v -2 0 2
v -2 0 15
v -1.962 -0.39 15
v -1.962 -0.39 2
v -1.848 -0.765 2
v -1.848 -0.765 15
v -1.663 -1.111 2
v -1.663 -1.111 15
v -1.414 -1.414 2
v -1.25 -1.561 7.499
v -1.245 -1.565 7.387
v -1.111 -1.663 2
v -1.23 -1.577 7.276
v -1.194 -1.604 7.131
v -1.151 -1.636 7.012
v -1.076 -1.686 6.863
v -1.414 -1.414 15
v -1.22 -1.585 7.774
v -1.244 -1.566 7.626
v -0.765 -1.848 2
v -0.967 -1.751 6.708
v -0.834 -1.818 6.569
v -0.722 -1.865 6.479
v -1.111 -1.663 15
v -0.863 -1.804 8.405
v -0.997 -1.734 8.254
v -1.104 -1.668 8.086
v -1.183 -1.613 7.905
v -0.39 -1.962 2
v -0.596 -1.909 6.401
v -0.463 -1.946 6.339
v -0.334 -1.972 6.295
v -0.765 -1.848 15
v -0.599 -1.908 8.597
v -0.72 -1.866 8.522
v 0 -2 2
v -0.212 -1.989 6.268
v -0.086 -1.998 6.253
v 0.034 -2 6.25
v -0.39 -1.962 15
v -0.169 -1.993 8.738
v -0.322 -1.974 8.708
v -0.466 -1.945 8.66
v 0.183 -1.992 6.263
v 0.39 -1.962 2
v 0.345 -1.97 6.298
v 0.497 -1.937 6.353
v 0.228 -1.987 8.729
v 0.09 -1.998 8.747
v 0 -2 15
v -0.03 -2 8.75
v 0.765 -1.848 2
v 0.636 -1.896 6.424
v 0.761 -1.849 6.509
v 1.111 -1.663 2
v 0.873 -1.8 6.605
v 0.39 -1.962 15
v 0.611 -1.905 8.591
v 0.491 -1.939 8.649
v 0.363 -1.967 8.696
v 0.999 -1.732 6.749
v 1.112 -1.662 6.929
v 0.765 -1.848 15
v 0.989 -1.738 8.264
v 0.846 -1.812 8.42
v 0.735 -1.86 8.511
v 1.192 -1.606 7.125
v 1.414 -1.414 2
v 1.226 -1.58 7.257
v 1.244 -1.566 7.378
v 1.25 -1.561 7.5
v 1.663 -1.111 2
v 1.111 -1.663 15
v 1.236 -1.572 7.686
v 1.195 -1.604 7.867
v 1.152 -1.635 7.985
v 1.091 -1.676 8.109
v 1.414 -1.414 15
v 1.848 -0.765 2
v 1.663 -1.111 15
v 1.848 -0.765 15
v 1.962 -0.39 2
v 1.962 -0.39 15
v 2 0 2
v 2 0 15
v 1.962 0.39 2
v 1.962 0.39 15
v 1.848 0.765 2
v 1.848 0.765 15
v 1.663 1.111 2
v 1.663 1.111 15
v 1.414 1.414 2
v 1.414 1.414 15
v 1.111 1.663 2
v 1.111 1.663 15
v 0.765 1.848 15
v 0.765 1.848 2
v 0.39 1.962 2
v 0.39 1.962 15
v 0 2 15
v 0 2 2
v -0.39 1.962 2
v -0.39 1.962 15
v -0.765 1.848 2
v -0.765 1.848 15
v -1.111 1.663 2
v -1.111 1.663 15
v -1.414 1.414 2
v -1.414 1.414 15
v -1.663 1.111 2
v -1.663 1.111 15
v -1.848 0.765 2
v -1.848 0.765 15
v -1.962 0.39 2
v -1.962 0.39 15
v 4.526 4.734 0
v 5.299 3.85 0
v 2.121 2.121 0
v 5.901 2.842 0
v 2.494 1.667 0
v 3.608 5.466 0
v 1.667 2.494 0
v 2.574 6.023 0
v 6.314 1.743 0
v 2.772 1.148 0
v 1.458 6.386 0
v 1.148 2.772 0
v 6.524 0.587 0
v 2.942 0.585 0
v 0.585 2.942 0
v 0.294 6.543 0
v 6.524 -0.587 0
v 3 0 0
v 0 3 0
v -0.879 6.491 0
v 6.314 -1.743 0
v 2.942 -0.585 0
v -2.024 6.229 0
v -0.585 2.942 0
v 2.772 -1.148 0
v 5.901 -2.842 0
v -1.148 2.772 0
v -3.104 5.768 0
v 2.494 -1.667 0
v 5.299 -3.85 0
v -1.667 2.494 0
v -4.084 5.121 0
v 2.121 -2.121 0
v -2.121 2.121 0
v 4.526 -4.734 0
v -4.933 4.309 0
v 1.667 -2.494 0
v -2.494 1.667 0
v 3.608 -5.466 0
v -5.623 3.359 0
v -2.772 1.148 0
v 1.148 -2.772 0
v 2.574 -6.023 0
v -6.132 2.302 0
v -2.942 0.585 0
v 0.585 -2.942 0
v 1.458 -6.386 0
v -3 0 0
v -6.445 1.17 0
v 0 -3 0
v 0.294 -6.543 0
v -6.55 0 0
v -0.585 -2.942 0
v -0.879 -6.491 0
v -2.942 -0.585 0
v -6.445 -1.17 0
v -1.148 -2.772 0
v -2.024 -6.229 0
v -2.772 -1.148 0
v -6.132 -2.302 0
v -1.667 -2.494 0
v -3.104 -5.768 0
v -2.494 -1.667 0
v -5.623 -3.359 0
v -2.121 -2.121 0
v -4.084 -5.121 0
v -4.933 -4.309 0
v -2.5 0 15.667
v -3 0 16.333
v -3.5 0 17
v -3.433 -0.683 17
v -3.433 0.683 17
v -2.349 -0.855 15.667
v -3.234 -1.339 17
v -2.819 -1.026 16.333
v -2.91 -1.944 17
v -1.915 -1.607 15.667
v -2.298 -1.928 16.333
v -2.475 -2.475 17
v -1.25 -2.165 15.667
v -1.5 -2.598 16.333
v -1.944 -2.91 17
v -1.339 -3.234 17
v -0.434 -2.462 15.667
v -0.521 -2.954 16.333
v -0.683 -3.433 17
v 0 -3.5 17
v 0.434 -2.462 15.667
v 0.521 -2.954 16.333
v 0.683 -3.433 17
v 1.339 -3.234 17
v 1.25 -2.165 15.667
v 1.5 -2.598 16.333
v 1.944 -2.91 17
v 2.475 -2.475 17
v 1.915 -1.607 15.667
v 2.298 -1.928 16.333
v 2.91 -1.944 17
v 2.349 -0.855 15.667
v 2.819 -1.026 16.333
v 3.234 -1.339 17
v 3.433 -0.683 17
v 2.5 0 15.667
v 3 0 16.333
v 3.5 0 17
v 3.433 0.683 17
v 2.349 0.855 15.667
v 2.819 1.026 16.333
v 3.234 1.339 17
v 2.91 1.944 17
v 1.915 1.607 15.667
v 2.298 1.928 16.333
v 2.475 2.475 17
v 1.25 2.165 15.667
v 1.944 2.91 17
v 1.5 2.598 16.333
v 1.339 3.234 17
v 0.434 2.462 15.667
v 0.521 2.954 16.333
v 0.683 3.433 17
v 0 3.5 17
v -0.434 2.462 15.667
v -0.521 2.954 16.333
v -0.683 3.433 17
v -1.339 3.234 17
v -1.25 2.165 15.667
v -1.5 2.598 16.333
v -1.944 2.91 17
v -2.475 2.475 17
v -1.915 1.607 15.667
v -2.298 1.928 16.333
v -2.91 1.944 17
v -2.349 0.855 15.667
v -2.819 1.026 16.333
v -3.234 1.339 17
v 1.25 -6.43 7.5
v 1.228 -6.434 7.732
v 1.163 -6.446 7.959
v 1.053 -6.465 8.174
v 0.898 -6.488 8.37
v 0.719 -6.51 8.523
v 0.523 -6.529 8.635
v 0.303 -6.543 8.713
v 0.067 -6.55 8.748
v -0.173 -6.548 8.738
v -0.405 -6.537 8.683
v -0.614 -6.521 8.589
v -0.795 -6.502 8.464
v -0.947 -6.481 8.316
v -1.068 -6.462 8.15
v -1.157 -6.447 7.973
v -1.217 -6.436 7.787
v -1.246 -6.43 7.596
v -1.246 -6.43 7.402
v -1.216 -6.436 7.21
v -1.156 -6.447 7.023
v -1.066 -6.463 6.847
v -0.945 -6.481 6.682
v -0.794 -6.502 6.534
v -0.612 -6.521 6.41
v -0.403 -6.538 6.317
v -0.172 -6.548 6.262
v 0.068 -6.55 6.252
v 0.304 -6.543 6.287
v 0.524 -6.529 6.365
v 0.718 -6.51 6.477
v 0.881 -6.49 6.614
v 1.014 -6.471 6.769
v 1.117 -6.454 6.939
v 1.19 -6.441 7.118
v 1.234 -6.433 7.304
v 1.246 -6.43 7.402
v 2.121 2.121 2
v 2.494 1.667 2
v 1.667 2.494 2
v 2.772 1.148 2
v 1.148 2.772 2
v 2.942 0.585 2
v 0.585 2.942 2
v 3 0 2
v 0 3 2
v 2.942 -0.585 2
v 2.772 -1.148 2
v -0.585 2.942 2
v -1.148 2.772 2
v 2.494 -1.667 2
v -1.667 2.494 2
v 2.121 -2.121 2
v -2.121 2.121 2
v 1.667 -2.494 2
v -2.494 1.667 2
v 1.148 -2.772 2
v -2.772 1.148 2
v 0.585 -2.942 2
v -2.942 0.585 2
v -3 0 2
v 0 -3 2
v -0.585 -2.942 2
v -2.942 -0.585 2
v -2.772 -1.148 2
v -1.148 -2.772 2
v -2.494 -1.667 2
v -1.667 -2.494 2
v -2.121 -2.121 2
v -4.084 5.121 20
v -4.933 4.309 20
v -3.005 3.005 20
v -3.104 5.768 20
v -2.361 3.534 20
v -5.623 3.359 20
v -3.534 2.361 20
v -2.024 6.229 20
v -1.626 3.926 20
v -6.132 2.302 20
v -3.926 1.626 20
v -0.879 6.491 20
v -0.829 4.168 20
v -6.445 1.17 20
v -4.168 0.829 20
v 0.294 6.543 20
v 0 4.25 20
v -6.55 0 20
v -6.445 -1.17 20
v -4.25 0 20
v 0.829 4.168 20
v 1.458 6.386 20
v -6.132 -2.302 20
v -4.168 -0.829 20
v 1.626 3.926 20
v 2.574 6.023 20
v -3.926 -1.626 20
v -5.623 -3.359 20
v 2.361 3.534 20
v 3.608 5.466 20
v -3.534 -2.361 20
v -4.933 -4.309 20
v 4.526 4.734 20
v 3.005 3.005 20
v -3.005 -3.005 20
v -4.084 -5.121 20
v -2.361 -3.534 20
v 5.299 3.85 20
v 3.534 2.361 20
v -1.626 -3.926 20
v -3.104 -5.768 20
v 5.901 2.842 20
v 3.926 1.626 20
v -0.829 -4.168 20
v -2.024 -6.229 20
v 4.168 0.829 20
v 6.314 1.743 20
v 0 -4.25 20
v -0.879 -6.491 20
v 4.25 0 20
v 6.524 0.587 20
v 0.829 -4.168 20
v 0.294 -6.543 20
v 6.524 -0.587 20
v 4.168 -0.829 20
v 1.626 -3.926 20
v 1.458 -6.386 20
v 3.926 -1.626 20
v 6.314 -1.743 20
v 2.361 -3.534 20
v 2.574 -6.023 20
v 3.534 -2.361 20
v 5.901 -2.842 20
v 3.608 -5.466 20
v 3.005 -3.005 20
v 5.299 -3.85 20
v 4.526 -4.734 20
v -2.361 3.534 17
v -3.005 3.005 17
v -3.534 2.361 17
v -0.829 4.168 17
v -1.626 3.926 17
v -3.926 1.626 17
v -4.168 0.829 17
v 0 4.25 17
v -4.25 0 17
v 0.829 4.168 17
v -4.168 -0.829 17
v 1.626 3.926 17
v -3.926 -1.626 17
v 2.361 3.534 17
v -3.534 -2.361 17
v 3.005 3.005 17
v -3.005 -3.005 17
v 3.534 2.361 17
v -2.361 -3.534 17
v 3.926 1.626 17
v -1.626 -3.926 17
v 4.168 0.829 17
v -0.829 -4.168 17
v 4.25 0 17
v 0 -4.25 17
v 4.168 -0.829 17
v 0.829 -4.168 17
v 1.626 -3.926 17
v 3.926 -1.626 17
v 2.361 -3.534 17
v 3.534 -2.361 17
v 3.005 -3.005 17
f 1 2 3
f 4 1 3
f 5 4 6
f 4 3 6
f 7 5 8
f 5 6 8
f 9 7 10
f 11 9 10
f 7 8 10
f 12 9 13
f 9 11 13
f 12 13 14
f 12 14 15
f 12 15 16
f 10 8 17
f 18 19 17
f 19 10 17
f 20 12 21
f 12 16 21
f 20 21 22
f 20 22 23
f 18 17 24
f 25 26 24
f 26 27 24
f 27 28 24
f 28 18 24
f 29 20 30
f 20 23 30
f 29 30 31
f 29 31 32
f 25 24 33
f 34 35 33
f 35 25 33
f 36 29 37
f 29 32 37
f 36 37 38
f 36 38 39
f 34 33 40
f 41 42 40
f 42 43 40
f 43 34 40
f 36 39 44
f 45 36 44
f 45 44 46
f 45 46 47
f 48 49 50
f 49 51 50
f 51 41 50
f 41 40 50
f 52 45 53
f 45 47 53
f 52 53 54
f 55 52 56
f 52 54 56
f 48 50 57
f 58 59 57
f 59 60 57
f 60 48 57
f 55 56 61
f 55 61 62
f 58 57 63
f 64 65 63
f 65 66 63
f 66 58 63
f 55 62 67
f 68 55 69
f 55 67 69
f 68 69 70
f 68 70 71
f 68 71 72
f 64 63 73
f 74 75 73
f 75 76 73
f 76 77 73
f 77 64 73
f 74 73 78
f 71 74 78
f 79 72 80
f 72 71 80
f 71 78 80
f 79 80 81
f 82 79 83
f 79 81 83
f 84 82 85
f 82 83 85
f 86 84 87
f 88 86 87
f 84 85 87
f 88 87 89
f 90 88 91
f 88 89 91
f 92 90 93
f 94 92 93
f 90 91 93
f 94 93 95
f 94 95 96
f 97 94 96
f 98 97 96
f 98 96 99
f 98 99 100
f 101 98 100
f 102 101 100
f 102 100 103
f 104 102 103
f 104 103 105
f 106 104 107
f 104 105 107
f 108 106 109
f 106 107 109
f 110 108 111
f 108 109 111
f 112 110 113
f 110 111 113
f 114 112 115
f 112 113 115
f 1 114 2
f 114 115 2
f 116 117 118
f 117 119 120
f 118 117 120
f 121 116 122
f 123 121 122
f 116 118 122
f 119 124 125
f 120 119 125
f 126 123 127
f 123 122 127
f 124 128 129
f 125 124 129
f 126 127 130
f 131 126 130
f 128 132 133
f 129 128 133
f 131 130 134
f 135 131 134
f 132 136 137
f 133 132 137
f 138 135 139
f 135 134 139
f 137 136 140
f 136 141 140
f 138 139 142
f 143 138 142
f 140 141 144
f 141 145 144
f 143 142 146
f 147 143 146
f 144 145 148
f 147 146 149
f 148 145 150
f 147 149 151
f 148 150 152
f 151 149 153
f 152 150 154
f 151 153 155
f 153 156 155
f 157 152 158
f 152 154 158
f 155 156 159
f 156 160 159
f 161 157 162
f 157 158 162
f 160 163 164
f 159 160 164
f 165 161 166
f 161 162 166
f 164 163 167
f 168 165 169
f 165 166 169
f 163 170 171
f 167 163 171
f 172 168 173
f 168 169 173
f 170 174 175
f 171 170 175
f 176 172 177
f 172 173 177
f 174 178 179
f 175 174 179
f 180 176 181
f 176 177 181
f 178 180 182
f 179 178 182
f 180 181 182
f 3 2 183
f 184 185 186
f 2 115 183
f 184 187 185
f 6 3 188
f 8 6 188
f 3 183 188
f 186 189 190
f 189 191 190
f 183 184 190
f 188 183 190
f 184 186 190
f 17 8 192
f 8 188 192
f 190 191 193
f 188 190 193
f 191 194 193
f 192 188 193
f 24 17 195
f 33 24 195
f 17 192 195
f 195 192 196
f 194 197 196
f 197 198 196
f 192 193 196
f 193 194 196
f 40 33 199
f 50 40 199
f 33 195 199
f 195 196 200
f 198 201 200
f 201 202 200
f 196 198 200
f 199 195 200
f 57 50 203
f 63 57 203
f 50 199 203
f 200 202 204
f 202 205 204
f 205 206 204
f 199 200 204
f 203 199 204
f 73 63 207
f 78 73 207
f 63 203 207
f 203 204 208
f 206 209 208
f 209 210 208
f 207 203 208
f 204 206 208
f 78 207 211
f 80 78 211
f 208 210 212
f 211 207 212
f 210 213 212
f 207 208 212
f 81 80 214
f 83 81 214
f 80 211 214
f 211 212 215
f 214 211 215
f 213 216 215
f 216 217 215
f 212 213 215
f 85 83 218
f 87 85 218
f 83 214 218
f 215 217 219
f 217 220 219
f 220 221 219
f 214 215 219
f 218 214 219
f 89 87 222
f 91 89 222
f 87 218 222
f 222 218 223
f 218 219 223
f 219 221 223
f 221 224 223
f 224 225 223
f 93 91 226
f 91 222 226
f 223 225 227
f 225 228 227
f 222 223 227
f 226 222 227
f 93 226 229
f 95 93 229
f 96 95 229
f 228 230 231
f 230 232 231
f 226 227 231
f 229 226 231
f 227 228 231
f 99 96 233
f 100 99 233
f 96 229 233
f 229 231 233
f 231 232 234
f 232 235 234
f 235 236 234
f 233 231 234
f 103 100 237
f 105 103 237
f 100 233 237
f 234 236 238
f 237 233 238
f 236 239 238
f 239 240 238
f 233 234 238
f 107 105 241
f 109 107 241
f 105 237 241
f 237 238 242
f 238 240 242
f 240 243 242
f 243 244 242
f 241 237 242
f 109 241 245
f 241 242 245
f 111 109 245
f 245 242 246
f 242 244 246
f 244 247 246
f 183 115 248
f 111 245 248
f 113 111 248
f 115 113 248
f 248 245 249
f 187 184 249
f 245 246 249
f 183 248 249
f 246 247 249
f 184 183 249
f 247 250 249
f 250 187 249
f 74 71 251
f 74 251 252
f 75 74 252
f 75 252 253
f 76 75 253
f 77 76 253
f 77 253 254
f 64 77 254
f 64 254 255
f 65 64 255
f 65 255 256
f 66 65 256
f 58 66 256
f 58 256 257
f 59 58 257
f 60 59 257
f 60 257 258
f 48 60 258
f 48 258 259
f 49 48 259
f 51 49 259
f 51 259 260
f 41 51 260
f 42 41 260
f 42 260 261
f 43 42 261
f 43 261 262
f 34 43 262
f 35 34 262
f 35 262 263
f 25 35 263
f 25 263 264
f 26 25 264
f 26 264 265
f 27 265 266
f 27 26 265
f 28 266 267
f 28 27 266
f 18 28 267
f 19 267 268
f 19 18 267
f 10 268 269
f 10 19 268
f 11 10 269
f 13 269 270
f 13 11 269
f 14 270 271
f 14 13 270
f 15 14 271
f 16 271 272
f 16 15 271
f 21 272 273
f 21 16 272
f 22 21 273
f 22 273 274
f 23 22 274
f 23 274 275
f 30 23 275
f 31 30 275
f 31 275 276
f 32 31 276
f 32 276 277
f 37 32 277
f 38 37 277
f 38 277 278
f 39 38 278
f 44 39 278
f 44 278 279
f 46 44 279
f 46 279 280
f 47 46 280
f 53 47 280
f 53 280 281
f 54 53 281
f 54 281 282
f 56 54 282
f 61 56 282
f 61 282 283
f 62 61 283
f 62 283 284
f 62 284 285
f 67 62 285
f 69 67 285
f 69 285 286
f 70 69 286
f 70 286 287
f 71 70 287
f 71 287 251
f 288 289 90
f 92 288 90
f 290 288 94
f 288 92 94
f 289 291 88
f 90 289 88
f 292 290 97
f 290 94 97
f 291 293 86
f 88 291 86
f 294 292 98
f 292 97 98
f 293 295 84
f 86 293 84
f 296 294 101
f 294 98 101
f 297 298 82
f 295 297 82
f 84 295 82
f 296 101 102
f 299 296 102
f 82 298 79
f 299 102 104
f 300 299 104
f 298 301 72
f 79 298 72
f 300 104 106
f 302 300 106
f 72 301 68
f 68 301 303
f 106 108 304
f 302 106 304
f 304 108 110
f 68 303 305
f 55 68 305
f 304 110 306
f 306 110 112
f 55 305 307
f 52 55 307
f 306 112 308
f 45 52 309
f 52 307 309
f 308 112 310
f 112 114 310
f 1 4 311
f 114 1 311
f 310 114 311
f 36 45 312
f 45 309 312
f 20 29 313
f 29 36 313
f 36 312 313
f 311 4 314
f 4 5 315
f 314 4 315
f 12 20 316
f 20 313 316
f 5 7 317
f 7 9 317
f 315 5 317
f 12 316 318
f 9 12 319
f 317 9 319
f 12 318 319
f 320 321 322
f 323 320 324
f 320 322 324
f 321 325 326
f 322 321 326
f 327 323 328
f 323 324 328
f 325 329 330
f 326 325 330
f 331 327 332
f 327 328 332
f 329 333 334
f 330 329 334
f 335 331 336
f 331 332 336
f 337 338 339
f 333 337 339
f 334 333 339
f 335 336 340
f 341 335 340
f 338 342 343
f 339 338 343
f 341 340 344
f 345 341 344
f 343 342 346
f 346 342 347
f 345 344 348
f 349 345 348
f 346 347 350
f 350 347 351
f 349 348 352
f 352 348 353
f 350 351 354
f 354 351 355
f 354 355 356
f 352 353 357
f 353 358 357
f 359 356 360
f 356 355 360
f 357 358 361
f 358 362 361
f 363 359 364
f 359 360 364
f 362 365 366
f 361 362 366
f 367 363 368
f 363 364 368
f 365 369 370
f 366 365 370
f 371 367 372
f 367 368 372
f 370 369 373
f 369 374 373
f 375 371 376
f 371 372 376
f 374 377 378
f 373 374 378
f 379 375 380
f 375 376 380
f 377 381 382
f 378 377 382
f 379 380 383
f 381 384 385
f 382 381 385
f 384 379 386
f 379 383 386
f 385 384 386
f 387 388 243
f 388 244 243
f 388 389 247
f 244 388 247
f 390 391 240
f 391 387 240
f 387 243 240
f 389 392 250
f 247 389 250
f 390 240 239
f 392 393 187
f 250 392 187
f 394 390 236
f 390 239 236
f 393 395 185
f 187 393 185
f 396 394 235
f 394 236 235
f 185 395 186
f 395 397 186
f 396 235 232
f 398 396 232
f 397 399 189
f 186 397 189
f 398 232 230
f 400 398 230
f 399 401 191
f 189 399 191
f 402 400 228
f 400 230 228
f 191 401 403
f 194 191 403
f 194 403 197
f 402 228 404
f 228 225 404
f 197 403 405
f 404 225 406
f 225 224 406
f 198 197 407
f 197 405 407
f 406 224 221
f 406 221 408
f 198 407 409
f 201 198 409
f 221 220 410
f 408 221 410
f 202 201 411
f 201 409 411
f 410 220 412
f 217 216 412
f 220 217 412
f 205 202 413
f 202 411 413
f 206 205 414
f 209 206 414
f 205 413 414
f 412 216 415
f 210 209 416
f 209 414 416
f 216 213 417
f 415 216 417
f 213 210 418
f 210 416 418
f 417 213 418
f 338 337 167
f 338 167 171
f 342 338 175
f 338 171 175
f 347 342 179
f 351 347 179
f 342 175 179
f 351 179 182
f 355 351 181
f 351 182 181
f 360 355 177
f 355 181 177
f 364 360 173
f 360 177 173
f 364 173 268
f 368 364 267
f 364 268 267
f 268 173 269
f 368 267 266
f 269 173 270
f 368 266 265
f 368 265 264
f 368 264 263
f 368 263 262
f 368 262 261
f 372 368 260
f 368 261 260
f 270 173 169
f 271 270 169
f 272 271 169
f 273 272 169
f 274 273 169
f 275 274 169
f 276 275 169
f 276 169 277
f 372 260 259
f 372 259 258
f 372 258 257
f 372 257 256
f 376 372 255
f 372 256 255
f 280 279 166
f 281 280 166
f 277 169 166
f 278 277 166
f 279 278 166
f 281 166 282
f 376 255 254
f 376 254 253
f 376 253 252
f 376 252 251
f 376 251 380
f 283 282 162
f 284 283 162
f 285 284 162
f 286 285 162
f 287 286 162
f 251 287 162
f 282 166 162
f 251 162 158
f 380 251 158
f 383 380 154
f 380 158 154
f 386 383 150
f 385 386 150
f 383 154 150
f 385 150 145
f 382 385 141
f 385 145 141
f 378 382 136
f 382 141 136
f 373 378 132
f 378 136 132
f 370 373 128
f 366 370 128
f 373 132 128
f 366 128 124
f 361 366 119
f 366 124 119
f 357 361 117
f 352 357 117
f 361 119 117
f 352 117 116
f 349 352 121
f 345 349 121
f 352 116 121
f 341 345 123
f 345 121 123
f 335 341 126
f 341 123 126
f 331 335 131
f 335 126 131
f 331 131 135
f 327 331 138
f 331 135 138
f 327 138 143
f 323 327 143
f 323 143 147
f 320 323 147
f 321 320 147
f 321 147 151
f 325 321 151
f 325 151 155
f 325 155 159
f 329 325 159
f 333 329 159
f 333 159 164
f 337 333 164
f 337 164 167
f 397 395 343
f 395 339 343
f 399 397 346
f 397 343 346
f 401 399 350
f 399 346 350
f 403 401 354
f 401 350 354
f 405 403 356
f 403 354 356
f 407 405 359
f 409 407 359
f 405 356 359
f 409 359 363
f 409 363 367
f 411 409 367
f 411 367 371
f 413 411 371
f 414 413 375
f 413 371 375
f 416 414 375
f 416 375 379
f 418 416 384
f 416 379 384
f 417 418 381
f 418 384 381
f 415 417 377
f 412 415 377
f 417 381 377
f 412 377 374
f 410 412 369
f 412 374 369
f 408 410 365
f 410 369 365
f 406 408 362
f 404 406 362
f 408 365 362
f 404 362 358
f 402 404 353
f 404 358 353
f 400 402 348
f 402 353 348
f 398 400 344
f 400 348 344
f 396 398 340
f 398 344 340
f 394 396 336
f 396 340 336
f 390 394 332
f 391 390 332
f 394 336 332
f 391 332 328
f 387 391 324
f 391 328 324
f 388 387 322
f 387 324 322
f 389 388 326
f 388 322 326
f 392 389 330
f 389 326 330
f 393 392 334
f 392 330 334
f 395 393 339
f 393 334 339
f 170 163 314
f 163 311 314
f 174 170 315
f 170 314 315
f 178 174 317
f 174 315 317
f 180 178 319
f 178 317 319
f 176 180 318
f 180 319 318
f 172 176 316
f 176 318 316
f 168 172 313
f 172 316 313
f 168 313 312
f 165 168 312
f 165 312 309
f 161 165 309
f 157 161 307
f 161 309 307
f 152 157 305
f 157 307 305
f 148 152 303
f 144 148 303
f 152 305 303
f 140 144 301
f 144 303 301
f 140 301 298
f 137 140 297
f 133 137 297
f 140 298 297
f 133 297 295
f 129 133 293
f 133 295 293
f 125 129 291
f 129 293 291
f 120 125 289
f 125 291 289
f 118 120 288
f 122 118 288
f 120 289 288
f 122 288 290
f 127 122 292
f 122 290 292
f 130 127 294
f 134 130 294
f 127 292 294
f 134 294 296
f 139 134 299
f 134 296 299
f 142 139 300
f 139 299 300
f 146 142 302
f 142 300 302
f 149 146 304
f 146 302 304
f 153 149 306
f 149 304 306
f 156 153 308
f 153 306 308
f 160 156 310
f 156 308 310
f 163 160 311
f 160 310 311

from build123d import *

# Parameters (mm, degrees)
F2_R     = 1.25
F3_DEPTH = 12.6


with BuildPart() as f1:
    # F0 (on Front) → F1 (revolve)
    with BuildSketch(Plane.XZ):
        Polygon((-2, 15), (-3.5, 17), (-4.25, 17), (-4.25, 20), (-6.55, 20), (-6.55, 0), (-3, 0), (-3, 2), (-2, 2), align=None)
    revolve(axis=Axis((0, 0, 17.224411), (0, 0, 1)))

    # F2 (on Front) → F3 (cut)
    with BuildSketch(Plane.XZ):
        with Locations((0, 7.5)):
            Circle(F2_R)
    extrude(amount=F3_DEPTH, mode=Mode.SUBTRACT)


solid = f1.part
